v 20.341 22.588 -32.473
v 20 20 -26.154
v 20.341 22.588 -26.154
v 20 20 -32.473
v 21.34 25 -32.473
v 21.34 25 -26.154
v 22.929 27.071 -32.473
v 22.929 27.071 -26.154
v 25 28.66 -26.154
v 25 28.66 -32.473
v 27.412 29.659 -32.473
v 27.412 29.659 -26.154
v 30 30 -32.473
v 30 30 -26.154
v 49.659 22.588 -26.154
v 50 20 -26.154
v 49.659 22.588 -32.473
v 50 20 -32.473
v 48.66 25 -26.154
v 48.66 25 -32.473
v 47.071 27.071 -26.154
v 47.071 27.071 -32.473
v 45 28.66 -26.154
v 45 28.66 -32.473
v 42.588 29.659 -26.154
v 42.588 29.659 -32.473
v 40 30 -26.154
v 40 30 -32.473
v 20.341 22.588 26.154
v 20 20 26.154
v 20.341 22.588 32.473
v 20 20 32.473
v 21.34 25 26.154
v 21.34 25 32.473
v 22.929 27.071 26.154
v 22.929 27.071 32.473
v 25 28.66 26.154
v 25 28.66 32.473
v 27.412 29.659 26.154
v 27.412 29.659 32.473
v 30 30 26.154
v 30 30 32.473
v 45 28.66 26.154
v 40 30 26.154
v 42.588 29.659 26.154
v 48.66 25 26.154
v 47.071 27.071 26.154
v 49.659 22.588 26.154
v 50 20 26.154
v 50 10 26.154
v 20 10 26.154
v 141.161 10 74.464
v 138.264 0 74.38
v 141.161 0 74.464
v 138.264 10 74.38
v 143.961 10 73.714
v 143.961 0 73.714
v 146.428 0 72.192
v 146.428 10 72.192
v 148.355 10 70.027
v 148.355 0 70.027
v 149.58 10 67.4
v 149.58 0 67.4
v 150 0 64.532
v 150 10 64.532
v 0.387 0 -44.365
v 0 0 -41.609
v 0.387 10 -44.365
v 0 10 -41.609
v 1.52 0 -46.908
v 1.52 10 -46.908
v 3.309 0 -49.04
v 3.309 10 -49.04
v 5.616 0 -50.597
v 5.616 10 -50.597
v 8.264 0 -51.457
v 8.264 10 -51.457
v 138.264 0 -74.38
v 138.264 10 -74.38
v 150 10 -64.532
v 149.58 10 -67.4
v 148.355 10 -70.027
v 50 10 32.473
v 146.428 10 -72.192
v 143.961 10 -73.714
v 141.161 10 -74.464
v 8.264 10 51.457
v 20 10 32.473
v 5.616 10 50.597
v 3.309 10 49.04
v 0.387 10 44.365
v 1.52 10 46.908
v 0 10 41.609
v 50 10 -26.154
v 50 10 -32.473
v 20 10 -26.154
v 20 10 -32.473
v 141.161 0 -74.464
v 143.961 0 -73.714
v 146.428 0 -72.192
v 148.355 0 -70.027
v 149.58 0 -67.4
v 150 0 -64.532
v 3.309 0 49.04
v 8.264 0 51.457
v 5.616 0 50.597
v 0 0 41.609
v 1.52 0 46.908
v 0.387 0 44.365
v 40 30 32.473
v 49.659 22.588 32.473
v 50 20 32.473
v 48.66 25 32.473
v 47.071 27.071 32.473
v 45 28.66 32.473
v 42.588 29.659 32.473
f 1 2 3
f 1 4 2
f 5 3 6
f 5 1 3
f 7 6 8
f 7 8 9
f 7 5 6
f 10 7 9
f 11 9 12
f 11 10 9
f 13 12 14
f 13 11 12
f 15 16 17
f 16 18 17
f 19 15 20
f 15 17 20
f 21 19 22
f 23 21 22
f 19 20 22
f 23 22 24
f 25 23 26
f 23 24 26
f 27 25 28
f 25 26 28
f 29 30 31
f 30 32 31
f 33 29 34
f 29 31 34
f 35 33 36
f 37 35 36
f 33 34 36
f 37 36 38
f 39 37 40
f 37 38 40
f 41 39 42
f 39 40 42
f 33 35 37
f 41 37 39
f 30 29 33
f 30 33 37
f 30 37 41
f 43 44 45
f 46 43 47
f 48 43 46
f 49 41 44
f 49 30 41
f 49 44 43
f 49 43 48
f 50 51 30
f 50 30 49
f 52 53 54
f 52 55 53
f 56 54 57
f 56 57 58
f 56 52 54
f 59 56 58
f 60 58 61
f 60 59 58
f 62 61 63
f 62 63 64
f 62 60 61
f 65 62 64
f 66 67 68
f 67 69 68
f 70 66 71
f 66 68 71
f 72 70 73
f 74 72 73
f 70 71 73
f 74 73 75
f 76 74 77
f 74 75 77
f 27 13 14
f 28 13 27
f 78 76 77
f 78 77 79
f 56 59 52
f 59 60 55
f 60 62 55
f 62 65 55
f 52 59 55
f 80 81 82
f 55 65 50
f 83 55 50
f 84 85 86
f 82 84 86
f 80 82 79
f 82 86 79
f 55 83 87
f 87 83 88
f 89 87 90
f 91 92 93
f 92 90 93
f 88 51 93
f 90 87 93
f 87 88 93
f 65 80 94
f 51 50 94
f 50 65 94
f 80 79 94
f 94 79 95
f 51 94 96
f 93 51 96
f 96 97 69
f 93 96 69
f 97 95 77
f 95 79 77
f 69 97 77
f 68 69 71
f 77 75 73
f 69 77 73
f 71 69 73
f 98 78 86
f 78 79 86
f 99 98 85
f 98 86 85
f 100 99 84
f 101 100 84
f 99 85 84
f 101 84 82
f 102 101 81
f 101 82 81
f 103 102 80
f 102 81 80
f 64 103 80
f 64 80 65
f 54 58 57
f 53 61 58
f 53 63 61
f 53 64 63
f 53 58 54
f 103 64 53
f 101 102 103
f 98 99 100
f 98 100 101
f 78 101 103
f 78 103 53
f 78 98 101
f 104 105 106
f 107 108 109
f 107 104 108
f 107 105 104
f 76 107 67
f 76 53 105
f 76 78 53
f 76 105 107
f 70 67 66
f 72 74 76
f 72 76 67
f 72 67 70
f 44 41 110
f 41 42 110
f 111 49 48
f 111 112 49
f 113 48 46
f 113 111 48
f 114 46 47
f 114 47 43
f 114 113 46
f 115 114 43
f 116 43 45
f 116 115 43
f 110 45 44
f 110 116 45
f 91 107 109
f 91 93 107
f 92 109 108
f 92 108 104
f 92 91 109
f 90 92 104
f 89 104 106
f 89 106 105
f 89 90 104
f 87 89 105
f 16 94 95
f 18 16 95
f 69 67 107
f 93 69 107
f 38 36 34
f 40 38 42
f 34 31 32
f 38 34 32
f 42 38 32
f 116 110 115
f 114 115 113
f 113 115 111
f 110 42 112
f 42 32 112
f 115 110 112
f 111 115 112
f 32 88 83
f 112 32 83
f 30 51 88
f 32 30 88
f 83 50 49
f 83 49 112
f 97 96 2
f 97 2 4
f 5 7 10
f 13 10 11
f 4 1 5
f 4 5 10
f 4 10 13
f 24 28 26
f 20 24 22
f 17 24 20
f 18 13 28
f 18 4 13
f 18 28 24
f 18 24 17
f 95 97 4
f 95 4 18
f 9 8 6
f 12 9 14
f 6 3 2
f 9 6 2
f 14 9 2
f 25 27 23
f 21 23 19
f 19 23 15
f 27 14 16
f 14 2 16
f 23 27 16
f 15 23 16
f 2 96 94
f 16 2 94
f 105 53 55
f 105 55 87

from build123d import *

# Parameters (mm, degrees)
BOSS_EXTRUDE1_DEPTH = 10
SKETCH2_W           = 30
SKETCH2_H           = 6.318939308
BOSS_EXTRUDE2_DEPTH = 20
FILLET2_R           = 10
FILLET3_R           = 10


with BuildPart() as part:
    # Sketch1 → Boss-Extrude1 (new body)
    with BuildSketch(Plane(origin=(0, 0, 0), x_dir=(1, 0, 0), z_dir=(0, 1, 0))):
        Polygon((0, 0), (0, 50), (150, 76.449047106), (150, -76.449047106), (0, -50), align=None)
    extrude(amount=BOSS_EXTRUDE1_DEPTH)

    # Sketch2 → Boss-Extrude2 (add)
    with BuildSketch(Plane(origin=(0, 10, 0), x_dir=(1, 0, 0), z_dir=(0, 1, 0))):
        with Locations((35, 29.313333891)):
            Rectangle(SKETCH2_W, SKETCH2_H)
    extrude(amount=BOSS_EXTRUDE2_DEPTH)

    # Fillet2
    fillet2_edges = [part.edges().sort_by_distance(p)[0] for p in [
        (20, 30, -29.313333891),
        (50, 30, -29.313333891),
    ]]
    fillet(fillet2_edges, radius=FILLET2_R)

    # Mirror1: part across plane


with BuildPart() as part_1:
    add(part.part)
    add(part.part.mirror(Plane.XY))

    # Fillet3
    fillet3_edges = [part_1.edges().sort_by_distance(p)[0] for p in [
        (150, 5, 76.449047106),
        (150, 5, -76.449047106),
        (0, 5, -50),
        (0, 5, 50),
    ]]
    fillet(fillet3_edges, radius=FILLET3_R)


solid = part_1.part
